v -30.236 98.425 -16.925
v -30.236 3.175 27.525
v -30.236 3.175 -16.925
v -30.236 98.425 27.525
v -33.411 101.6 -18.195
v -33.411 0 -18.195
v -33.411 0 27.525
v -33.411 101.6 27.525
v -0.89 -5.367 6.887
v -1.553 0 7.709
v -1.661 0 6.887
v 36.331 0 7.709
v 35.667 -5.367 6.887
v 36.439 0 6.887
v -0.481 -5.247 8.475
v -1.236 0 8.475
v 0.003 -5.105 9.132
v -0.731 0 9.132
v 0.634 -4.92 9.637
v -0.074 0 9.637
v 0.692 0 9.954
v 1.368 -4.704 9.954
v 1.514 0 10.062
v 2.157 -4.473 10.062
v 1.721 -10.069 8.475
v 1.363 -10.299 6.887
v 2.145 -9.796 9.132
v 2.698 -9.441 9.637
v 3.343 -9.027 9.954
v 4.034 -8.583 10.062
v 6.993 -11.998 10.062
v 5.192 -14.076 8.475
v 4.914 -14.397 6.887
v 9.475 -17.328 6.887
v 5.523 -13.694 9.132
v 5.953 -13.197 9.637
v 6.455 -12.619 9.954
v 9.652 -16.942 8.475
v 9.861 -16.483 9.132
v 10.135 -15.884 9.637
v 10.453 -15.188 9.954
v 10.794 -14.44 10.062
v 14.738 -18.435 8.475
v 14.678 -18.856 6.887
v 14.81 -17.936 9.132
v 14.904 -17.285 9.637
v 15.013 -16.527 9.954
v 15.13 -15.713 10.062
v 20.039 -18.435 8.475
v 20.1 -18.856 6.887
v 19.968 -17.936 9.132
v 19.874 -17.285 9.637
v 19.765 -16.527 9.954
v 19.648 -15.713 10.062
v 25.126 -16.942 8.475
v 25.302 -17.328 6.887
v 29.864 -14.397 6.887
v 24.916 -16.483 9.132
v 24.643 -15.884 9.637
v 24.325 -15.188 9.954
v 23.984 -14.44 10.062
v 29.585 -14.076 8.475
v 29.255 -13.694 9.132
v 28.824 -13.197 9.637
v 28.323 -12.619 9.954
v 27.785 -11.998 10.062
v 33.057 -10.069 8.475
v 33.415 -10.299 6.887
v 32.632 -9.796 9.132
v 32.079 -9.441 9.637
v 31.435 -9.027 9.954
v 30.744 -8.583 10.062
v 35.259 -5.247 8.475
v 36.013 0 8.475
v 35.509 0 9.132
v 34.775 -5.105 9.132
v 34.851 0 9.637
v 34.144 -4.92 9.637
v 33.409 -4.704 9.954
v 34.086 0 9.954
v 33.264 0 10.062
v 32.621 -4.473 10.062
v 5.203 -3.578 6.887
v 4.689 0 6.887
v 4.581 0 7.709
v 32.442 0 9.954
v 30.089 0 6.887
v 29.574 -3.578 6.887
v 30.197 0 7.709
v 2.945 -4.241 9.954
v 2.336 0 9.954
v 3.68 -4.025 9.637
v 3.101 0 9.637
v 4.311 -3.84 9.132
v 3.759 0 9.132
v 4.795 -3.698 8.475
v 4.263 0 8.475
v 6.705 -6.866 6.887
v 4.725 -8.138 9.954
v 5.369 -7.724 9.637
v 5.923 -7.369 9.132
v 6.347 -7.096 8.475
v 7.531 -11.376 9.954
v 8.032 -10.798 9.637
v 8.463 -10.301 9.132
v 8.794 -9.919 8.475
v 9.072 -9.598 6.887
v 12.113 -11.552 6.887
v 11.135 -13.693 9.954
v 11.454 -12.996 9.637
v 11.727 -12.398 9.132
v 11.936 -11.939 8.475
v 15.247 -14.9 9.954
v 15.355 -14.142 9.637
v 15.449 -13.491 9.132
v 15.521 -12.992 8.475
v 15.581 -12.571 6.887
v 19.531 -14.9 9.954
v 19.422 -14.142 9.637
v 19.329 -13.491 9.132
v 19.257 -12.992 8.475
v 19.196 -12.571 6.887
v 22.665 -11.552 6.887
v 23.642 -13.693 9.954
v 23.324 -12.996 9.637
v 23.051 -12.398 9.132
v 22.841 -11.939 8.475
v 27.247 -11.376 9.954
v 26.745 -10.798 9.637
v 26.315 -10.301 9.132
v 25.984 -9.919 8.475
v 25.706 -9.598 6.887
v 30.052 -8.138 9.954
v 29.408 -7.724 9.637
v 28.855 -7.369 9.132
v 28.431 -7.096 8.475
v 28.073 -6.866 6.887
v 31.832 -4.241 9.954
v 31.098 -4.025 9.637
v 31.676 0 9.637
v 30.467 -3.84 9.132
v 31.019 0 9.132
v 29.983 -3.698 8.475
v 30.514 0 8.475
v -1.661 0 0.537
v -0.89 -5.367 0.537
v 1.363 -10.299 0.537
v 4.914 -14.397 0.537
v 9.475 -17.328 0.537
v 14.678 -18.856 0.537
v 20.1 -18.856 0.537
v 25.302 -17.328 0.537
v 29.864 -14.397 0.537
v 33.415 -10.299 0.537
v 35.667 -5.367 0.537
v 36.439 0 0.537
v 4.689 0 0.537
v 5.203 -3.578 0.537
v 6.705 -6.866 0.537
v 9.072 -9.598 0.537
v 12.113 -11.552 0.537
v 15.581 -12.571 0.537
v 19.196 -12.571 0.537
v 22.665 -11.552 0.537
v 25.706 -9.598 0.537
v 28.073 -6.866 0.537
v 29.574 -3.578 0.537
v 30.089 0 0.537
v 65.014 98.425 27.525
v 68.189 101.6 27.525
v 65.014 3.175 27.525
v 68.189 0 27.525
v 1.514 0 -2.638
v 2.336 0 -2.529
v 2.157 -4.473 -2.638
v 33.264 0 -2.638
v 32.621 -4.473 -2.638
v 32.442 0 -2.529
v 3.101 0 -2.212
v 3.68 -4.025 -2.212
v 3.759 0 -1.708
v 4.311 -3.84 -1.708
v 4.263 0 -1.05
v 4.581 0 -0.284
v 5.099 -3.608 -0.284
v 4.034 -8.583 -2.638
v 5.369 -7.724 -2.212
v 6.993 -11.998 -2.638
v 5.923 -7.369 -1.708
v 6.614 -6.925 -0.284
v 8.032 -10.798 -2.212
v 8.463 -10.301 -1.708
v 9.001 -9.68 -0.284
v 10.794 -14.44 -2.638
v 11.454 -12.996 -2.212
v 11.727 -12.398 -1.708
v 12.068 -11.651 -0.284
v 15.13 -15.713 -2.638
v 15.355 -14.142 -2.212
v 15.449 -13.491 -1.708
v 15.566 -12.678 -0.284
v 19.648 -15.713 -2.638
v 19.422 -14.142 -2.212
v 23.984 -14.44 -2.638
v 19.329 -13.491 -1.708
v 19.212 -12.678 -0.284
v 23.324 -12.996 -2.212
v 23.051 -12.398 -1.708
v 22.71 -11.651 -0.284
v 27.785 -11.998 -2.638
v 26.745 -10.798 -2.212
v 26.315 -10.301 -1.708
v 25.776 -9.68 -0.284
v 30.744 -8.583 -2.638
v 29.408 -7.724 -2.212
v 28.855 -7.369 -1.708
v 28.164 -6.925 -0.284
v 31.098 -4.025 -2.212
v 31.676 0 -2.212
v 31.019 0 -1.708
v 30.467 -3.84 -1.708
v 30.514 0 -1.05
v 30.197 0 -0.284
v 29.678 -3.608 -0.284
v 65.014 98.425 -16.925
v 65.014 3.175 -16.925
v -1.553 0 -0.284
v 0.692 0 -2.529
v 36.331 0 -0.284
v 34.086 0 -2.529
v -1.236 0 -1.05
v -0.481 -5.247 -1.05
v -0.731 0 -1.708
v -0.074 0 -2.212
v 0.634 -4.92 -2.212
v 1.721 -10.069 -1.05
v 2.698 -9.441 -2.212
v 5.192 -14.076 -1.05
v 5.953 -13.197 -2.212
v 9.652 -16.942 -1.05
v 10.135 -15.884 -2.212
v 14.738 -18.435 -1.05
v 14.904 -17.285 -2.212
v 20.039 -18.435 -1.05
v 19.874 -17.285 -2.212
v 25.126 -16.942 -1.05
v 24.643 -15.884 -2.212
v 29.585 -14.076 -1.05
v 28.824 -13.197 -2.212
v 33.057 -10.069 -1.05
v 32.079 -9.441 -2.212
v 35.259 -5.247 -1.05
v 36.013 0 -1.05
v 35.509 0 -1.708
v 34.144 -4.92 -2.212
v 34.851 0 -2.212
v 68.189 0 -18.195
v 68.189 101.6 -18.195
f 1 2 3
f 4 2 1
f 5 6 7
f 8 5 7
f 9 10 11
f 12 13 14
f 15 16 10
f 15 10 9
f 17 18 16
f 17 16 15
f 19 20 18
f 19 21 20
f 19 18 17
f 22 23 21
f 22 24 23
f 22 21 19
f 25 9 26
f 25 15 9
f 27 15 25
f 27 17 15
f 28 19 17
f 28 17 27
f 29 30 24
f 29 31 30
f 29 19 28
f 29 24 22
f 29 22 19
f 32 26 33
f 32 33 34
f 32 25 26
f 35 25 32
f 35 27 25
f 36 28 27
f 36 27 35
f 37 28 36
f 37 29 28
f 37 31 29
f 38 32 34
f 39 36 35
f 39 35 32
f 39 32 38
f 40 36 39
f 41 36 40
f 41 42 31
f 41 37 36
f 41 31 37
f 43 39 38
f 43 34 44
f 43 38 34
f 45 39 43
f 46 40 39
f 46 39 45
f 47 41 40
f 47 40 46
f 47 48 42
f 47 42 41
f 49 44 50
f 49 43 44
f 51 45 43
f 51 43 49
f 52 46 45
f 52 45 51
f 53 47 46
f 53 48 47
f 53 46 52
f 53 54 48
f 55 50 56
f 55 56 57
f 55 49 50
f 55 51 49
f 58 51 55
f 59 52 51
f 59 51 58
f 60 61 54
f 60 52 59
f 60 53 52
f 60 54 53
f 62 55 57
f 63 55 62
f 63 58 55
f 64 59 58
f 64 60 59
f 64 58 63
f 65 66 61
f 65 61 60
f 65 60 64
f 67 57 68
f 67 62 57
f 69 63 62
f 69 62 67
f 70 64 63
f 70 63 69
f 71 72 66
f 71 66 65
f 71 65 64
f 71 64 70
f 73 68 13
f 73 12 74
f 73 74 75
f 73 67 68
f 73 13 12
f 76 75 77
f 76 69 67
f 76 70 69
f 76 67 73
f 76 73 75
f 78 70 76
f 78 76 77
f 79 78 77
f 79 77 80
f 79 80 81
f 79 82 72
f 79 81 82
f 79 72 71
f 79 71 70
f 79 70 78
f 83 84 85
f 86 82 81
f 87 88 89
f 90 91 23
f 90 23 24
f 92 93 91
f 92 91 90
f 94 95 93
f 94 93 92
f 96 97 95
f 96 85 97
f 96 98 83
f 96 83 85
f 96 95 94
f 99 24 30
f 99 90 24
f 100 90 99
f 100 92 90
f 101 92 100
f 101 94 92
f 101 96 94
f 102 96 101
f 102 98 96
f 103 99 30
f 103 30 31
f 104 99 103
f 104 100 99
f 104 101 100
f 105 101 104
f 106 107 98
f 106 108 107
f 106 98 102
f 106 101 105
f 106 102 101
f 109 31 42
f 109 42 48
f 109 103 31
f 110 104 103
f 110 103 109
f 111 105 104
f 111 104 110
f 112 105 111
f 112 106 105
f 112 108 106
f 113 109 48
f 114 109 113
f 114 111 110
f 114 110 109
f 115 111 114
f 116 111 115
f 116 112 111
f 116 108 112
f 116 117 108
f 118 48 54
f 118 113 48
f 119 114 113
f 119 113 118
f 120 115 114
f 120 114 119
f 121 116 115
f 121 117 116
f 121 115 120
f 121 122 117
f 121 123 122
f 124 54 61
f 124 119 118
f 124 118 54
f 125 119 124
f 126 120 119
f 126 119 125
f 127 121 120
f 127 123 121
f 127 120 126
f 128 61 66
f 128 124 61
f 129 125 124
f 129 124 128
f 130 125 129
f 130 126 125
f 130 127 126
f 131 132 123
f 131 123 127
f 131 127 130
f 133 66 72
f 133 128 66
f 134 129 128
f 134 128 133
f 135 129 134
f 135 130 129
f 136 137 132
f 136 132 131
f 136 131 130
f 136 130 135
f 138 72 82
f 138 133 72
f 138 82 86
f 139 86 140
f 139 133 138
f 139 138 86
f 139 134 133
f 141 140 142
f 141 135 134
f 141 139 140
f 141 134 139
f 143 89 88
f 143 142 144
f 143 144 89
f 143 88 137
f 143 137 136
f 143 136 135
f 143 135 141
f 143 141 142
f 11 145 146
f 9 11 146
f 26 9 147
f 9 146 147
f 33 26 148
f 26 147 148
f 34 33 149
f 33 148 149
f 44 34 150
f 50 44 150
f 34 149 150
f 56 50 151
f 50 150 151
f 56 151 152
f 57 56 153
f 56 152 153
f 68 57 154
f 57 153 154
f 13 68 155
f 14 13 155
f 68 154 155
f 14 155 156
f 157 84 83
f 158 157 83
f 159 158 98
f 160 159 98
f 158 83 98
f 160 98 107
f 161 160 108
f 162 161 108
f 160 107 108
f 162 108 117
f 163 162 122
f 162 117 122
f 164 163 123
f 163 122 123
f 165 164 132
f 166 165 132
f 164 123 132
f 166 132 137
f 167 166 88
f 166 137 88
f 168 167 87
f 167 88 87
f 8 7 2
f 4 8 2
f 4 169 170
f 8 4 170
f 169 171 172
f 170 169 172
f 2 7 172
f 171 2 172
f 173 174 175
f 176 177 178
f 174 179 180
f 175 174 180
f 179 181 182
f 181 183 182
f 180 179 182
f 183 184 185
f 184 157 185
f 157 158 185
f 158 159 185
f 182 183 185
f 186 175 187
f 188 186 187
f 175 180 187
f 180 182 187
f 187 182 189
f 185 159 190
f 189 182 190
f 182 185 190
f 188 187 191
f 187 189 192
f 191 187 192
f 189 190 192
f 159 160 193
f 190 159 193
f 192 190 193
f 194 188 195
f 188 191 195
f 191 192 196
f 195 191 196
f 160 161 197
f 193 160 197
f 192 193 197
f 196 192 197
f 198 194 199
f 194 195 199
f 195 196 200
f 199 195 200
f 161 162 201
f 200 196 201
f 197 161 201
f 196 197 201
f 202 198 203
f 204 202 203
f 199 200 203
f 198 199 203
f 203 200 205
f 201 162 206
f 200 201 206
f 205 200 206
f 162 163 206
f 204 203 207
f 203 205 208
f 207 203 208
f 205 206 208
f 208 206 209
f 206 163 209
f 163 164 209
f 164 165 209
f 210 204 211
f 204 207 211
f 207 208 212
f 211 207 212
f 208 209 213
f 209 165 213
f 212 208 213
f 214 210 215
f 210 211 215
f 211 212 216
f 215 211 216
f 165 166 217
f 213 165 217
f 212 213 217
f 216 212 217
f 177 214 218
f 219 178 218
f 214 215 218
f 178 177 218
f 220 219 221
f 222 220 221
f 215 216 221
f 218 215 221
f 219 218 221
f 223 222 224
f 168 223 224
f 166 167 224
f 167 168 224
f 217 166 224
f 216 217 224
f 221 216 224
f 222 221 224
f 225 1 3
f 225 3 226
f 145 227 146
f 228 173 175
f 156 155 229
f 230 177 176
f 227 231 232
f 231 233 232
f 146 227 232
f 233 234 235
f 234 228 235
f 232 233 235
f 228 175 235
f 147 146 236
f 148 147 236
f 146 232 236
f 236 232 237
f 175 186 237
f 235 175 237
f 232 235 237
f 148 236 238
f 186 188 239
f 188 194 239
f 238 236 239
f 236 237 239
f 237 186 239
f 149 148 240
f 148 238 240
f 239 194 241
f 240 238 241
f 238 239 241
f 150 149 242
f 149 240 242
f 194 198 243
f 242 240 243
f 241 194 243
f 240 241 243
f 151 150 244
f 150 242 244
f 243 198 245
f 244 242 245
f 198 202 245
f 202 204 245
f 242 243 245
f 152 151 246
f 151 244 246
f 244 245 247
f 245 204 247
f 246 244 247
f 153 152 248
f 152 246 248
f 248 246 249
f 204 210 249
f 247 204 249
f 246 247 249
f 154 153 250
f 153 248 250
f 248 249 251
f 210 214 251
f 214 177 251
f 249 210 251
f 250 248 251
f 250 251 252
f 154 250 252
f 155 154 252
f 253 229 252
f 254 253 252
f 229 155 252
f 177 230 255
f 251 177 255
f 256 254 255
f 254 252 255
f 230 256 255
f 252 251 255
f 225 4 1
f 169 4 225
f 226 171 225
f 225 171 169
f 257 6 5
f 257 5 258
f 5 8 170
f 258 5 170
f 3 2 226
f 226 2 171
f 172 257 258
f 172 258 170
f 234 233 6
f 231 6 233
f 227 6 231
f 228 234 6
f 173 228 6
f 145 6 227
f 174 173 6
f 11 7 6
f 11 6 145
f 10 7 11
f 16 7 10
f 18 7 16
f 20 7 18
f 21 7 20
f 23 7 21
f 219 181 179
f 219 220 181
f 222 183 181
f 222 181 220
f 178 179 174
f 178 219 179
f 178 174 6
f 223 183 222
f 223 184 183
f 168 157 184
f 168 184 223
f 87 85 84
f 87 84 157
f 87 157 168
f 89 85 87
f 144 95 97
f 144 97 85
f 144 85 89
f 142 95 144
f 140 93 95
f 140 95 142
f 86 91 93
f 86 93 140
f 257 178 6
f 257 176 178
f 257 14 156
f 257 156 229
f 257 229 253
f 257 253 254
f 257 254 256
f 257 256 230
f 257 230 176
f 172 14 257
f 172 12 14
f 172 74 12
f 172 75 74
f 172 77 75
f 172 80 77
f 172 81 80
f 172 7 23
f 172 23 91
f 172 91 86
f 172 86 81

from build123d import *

# Parameters (mm, degrees)
F0_W     = 101.6
F0_H     = 45.72
F1_DEPTH = 101.6
F2_W     = 95.25
F2_H     = 95.25
F3_DEPTH = 44.45
F4_W     = 19.05
F4_H     = 6.35
F5_ANGLE = 180
F7_DEPTH = 25.4
F8_R     = 3.17499


# Not quite as in the source:
# - a fillet or chamfer is up to 0.001 mm smaller than in the source, because OpenCascade refuses the exact size


with BuildPart() as f1:
    # F0 (on Front) → F1 (new body)
    with BuildSketch(Plane.XZ):
        with Locations((17.3888143581, 4.6649015626)):
            Rectangle(F0_W, F0_H)
    extrude(amount=-F1_DEPTH)

    # F2 (on face) → F3 (cut)
    with BuildSketch(Plane.XY.offset(27.5249015626)):
        with Locations((17.3888143581, 50.8)):
            Rectangle(F2_W, F2_H)
    extrude(amount=-F3_DEPTH, mode=Mode.SUBTRACT)

    # F4 (on face) → F5 (revolve)
    with BuildSketch(Plane.XZ):
        with Locations((7.8638143581, 6.8874015626)):
            Rectangle(F4_W, F4_H)
        with Locations((7.8638143581, 0.5374015626)):
            Rectangle(F4_W, F4_H)
    revolve(axis=Axis((17.3888143581, 0, 3.7124015626), (0, 0, 1)), revolution_arc=F5_ANGLE)

    # F6 (on face) → F7 (cut)
    with BuildSketch(Plane.XY.offset(10.0624015626)):
        with BuildLine():
            Line((30.0888143581, 0), (4.6888143581, 0))
            ThreePointArc((4.6888143581, 0), (17.3888143581, -12.7), (30.0888143581, 0))
        make_face()
    extrude(amount=-F7_DEPTH, mode=Mode.SUBTRACT)

    # F8 (radius 3.175 in the source; OpenCascade refuses exactly that, so slightly less here)
    f8_edges = [f1.edges().sort_by_distance(p)[0] for p in [
        (17.388814, -19.05, 10.062402),
        (17.388814, -12.7, 10.062402),
        (17.388814, -19.05, -2.637598),
        (17.388814, -12.7, -2.637598),
    ]]
    fillet(f8_edges, radius=F8_R)


solid = f1.part
